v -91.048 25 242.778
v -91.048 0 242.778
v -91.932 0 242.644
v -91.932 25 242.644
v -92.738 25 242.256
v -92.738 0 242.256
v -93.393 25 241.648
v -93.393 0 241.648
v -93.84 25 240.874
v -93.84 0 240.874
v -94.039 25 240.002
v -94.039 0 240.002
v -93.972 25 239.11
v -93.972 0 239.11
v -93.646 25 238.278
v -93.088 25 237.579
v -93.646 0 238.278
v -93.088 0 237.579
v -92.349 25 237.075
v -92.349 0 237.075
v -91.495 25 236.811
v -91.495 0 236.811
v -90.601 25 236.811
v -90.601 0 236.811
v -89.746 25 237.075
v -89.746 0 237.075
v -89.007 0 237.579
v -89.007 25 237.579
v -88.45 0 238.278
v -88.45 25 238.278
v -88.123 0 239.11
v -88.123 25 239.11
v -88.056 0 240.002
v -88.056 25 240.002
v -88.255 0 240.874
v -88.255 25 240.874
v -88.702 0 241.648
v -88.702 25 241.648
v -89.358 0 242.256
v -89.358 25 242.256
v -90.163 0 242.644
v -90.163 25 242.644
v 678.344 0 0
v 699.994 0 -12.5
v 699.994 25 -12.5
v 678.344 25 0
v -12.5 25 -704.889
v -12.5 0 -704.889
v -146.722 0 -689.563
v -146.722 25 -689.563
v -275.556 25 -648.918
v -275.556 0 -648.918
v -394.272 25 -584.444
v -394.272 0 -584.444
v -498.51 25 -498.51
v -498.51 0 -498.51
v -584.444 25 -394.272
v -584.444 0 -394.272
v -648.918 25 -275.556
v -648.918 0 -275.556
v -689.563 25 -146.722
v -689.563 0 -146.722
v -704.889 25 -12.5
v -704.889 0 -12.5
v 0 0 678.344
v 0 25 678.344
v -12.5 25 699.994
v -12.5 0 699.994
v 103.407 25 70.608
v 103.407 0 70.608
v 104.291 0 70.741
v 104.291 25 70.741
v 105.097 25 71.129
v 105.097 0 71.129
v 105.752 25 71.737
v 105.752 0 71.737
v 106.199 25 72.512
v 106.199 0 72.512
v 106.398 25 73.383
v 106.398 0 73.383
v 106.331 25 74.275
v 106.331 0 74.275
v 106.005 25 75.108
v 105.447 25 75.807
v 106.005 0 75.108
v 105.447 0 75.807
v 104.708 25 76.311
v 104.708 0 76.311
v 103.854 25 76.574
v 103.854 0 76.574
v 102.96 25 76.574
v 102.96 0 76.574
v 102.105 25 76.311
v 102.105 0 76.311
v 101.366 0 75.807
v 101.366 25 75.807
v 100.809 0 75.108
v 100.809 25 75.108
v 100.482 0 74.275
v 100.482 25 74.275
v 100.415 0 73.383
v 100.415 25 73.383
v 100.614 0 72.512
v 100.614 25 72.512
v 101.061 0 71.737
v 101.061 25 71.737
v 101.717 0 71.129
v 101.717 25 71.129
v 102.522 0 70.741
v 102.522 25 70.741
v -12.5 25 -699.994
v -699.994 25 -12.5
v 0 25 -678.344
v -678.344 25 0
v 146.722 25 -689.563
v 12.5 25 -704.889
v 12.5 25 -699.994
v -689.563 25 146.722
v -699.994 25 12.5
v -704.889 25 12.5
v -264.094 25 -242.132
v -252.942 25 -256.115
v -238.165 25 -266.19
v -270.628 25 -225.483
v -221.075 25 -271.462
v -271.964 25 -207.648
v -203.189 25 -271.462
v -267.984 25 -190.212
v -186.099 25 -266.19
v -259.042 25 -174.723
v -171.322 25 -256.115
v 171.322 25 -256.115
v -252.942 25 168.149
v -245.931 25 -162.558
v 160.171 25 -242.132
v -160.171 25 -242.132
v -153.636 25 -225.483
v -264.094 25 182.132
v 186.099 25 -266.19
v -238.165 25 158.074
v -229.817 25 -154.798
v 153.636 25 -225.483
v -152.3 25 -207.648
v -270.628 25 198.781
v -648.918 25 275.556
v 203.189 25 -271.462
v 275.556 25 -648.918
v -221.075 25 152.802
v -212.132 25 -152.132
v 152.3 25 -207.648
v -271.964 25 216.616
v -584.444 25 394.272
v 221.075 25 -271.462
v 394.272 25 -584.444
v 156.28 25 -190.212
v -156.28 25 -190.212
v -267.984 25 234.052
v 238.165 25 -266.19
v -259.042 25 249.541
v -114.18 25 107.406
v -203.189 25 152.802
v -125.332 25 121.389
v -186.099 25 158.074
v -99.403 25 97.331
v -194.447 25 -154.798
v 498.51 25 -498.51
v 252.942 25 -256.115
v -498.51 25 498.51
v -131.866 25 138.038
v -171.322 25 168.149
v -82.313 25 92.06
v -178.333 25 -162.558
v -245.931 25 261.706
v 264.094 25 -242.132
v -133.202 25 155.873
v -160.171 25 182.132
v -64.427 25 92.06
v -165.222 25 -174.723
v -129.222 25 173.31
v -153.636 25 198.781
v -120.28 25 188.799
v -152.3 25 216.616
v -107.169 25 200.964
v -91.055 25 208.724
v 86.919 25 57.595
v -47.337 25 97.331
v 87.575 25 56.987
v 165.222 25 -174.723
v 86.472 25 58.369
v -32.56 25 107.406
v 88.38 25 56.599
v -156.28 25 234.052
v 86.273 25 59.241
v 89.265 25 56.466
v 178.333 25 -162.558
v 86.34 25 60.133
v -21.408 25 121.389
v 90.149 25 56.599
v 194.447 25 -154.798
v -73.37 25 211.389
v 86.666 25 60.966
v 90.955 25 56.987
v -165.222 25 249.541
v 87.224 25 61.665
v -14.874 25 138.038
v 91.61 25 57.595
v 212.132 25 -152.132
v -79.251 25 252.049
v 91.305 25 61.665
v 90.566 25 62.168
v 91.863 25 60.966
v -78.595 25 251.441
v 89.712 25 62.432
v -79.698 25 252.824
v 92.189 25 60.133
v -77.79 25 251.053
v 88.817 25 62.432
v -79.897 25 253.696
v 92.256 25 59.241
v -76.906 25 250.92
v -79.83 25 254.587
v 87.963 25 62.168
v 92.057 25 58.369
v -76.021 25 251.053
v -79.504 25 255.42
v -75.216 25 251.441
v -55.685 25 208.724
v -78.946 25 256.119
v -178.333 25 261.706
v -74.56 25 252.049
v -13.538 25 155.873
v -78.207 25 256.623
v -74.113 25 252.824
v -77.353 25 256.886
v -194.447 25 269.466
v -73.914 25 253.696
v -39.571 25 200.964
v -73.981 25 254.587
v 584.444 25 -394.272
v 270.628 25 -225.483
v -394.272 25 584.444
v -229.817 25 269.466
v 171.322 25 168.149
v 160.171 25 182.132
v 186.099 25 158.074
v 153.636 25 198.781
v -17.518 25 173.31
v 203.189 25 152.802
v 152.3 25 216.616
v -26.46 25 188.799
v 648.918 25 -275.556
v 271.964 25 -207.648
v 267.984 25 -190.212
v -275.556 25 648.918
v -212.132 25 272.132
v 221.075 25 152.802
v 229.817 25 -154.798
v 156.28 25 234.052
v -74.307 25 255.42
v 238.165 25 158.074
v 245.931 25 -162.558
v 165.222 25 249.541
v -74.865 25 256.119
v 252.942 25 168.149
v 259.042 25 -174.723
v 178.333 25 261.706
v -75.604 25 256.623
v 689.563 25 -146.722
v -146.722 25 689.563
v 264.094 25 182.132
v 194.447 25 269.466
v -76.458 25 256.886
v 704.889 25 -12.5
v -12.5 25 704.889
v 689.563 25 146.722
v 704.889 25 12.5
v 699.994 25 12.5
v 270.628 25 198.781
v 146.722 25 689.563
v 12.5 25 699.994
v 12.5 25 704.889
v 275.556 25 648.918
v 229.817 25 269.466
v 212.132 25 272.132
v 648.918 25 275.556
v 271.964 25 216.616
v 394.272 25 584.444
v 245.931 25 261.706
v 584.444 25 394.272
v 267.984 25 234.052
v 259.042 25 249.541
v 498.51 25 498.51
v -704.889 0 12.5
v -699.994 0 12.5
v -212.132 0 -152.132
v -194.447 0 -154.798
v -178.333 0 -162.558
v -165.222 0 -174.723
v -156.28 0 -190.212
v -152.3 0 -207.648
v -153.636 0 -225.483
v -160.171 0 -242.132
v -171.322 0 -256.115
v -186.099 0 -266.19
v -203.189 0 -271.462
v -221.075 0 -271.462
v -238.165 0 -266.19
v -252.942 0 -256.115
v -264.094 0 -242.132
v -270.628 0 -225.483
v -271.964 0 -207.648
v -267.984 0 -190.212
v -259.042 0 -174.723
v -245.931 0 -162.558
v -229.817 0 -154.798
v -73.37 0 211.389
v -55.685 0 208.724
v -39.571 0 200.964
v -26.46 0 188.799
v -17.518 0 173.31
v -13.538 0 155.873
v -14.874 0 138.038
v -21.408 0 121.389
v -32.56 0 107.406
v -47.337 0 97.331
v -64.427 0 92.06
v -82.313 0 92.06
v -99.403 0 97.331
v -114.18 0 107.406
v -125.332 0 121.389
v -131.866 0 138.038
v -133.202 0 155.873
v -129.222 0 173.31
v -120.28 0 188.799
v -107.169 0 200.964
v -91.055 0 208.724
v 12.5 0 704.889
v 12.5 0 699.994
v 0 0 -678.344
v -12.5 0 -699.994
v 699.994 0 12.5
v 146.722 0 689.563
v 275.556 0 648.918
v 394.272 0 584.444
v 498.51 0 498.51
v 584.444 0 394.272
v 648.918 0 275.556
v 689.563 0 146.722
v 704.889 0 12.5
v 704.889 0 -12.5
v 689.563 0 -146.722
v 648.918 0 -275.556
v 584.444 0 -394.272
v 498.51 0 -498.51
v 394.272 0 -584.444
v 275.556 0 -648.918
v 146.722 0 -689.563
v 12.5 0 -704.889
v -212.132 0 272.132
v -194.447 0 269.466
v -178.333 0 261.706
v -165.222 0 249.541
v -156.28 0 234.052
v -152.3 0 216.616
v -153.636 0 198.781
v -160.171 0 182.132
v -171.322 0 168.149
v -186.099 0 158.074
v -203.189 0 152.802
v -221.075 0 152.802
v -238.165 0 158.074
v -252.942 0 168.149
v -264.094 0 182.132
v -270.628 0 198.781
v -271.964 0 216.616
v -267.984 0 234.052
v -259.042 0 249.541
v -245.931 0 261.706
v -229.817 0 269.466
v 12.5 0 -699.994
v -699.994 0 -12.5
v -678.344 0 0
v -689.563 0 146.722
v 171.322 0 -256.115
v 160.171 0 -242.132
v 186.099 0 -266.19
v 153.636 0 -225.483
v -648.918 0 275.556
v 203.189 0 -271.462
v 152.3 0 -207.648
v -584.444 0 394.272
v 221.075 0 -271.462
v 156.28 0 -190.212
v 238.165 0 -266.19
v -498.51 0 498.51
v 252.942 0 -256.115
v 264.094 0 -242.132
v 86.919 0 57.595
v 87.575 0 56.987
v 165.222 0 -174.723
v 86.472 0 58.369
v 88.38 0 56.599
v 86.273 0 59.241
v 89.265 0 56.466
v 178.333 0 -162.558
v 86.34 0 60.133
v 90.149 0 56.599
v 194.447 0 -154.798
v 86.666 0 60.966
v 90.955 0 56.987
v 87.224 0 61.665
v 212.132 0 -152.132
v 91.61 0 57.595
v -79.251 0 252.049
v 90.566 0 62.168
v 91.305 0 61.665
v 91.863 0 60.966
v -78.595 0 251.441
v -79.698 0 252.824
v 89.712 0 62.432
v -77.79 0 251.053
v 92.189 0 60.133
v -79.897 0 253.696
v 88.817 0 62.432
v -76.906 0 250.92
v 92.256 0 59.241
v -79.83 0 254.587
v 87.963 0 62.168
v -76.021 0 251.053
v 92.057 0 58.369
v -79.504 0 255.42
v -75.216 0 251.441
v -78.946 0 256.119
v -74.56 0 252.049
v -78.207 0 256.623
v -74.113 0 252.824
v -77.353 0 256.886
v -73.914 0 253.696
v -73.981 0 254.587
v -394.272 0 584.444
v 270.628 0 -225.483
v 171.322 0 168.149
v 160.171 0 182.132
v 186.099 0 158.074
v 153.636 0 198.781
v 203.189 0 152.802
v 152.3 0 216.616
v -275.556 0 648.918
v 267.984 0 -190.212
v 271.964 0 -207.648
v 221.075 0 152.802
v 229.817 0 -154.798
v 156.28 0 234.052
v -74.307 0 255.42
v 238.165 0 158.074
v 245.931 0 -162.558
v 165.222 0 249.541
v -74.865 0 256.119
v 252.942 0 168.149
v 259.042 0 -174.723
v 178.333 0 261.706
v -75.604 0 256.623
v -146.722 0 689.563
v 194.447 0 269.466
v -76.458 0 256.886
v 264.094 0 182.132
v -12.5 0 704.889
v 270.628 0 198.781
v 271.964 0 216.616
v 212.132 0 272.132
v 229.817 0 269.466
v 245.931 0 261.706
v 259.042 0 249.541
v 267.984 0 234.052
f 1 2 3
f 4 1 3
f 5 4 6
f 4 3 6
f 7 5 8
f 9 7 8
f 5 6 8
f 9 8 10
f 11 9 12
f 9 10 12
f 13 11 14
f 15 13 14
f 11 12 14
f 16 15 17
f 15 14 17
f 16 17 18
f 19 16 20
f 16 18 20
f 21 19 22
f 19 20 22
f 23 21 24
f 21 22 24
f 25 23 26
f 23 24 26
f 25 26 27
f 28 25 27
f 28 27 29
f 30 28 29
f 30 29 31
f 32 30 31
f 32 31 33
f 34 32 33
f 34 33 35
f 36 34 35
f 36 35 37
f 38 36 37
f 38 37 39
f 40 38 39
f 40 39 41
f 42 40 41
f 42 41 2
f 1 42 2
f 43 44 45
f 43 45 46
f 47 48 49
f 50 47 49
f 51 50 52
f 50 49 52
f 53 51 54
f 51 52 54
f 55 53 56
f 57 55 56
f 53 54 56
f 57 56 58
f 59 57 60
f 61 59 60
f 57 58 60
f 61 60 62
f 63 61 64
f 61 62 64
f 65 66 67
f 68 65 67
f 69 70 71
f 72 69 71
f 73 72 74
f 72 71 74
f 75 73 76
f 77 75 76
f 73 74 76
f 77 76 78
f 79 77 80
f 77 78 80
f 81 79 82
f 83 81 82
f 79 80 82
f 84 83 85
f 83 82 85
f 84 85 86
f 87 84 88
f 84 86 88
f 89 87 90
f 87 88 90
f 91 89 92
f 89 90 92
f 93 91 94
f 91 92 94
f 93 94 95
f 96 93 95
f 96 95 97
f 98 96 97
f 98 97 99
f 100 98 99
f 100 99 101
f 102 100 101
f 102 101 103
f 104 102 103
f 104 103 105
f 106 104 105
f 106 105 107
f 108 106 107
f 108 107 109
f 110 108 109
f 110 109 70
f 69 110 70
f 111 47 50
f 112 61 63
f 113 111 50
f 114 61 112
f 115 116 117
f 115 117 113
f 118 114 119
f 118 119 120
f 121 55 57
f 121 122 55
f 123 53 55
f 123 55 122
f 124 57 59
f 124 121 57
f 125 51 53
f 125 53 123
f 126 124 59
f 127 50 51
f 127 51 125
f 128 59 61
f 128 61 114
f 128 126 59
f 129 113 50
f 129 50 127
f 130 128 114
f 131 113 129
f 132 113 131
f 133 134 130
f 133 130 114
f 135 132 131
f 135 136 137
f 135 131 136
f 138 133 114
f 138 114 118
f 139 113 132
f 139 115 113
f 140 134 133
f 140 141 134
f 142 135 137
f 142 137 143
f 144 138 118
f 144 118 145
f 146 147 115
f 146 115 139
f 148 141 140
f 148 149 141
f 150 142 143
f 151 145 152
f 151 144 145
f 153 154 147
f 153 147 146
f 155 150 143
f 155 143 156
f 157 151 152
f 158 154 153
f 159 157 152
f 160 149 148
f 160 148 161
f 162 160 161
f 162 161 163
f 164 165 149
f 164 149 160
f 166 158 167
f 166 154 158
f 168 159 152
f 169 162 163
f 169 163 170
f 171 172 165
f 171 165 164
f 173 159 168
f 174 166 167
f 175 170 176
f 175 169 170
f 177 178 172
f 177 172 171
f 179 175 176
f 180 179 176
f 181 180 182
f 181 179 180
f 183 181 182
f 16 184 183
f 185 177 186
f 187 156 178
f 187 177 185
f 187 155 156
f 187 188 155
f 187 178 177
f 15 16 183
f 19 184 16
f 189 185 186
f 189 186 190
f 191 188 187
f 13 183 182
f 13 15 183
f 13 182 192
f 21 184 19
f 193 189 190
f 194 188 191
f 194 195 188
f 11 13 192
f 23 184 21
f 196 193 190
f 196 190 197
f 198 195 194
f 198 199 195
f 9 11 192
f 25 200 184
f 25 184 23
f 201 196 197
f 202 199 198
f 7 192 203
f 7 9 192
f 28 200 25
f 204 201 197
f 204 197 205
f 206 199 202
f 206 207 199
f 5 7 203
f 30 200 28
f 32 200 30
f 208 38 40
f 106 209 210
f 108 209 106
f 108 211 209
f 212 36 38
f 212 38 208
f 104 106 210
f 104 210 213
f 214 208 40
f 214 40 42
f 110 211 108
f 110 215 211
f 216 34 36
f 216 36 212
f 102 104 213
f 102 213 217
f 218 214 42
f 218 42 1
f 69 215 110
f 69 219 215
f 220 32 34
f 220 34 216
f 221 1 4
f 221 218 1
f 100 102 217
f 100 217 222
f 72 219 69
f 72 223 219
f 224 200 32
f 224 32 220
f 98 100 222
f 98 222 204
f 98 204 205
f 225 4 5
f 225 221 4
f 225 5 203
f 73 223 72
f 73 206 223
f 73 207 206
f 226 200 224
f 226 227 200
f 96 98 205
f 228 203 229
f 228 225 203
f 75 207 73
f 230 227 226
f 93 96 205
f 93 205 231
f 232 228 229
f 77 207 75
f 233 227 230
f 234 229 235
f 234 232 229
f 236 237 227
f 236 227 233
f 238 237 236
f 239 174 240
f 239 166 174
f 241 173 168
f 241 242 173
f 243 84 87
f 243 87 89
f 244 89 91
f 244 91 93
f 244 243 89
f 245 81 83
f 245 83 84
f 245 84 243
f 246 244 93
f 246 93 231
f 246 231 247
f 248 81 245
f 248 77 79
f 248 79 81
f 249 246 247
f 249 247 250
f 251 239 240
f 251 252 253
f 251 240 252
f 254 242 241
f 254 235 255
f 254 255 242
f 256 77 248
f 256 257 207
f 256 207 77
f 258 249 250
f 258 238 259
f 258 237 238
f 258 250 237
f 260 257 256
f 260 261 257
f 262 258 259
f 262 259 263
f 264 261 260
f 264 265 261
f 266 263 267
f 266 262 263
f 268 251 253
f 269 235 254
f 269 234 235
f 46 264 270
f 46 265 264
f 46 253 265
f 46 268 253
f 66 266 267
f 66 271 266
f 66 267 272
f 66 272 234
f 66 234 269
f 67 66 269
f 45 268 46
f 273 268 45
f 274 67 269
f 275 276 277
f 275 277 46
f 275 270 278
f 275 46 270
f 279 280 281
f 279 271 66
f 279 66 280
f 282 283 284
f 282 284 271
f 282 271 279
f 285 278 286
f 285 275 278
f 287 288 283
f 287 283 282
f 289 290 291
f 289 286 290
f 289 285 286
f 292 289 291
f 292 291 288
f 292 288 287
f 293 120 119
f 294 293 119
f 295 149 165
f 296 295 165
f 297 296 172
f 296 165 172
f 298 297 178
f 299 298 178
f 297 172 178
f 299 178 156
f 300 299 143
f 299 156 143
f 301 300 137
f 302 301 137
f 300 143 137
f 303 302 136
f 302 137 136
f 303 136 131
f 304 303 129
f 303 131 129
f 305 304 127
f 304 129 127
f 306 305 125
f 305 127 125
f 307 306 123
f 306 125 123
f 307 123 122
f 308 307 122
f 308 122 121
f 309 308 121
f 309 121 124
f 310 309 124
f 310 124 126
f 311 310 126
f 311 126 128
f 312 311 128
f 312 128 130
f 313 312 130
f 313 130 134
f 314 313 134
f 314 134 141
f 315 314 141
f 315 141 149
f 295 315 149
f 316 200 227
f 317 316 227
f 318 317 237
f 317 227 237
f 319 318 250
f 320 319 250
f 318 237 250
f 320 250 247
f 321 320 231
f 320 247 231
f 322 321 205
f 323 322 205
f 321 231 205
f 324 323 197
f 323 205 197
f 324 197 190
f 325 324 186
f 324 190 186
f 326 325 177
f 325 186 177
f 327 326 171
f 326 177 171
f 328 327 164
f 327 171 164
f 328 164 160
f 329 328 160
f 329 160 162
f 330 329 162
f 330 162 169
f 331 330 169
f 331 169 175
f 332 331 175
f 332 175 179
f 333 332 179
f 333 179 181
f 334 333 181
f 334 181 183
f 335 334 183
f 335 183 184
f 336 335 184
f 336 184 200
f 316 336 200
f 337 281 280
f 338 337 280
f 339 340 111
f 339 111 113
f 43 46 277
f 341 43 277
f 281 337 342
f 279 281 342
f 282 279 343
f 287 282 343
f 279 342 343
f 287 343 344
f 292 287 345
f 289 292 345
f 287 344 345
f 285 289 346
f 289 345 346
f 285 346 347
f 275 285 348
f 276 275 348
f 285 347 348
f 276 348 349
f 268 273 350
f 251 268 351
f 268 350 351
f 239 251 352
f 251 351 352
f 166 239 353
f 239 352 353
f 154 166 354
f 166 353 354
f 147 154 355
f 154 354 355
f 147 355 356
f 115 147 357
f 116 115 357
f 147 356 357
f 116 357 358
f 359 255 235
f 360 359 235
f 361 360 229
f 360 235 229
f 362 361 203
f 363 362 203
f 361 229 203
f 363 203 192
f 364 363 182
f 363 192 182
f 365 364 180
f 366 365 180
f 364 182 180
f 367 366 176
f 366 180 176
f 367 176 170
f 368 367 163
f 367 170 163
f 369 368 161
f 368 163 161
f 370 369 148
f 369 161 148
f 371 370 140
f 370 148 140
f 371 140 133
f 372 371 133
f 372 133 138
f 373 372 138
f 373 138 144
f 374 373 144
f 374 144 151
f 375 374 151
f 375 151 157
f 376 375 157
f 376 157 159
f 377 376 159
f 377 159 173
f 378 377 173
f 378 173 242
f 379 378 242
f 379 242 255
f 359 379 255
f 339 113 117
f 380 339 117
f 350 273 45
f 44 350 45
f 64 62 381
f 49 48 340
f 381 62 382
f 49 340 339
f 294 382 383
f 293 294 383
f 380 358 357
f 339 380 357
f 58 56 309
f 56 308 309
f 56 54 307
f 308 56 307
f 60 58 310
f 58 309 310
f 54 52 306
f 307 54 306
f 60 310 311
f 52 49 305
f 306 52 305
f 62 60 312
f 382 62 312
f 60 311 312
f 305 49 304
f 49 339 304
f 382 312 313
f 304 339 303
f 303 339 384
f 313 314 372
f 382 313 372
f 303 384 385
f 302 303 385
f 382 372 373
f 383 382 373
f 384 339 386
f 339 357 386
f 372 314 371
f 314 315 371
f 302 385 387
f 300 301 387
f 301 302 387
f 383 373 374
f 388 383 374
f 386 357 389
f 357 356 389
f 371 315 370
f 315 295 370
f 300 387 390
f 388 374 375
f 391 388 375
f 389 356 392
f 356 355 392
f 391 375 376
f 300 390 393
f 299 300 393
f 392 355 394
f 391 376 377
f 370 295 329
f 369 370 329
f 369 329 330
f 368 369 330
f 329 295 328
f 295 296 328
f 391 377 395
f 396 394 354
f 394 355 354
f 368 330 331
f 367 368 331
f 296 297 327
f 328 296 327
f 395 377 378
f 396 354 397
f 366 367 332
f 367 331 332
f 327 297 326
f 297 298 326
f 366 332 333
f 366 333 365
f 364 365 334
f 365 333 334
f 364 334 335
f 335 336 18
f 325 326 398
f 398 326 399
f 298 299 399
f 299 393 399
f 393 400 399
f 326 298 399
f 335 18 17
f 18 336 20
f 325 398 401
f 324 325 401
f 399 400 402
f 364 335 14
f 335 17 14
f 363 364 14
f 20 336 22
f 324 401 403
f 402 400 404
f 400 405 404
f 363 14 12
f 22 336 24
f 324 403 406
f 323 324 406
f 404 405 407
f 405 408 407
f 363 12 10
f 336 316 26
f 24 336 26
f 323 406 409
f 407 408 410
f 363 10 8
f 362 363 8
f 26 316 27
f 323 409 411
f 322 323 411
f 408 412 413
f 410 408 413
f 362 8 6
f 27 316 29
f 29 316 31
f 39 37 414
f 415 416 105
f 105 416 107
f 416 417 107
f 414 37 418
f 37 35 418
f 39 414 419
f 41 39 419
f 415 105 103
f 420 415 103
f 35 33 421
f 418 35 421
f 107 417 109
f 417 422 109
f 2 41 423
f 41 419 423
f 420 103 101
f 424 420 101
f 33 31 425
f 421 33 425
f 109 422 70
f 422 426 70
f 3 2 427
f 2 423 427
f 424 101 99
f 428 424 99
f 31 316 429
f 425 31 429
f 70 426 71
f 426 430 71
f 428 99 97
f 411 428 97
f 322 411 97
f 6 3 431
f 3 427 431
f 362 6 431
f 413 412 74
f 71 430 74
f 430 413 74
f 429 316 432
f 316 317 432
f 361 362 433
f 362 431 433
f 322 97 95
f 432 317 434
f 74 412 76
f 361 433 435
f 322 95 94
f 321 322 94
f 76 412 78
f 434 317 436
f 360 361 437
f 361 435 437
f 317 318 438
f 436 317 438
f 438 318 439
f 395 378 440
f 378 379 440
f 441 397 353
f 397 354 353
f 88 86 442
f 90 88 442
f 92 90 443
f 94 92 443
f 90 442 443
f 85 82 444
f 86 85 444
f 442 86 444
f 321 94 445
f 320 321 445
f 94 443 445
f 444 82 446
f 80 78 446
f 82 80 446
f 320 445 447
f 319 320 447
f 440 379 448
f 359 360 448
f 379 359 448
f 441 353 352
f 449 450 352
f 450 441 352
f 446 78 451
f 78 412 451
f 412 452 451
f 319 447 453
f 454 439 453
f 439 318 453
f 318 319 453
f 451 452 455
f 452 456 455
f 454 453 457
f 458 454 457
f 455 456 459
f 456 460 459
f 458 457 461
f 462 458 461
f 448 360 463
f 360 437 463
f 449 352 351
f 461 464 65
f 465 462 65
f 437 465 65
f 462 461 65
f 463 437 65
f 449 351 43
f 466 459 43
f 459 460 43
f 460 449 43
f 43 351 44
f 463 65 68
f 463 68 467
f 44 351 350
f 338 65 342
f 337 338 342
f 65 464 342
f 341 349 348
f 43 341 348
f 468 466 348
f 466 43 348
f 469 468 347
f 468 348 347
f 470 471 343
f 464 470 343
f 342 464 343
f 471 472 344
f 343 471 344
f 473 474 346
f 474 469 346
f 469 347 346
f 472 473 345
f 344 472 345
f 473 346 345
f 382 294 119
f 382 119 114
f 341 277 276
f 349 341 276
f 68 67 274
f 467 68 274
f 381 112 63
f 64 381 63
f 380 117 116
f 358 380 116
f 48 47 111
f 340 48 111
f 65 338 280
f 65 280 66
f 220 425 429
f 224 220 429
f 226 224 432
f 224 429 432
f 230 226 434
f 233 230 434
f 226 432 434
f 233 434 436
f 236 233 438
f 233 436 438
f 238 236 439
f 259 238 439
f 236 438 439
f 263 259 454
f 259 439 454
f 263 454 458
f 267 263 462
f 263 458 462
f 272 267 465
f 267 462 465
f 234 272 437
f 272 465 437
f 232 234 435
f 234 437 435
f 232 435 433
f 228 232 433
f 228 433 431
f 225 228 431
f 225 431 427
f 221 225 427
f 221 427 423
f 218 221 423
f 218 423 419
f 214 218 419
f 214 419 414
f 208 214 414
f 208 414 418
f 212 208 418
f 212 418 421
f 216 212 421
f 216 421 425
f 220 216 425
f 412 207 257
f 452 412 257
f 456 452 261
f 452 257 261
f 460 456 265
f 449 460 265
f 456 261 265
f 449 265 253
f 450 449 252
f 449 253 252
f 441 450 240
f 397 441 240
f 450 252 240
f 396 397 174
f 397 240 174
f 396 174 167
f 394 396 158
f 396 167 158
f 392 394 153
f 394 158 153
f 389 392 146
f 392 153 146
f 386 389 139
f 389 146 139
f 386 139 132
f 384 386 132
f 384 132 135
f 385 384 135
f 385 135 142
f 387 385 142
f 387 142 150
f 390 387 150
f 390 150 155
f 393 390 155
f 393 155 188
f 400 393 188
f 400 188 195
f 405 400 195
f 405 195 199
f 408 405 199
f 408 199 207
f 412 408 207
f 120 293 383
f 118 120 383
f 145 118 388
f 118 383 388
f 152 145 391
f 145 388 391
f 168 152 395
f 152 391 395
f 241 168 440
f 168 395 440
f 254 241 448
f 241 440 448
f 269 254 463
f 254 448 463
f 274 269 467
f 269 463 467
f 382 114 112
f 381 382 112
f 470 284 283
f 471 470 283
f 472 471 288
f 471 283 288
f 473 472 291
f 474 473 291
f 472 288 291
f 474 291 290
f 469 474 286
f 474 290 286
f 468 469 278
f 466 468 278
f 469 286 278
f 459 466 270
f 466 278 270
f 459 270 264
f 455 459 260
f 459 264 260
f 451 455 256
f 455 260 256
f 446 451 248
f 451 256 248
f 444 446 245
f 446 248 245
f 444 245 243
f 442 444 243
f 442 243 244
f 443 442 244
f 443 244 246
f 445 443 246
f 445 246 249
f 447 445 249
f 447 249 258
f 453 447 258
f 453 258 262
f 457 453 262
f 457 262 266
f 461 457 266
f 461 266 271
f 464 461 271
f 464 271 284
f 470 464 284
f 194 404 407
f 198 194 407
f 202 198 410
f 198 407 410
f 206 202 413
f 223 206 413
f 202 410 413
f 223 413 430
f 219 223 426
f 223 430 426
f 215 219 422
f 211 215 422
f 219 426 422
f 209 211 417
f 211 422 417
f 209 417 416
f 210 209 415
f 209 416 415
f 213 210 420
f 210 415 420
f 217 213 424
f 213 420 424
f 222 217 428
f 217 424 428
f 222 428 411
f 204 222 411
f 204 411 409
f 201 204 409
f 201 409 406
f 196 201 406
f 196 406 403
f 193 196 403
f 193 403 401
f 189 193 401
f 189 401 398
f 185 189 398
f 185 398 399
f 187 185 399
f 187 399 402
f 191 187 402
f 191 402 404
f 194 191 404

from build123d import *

# Parameters (mm, degrees)
SKETCH_1_R               = 705
EXTRUDE_1_DEPTH          = 25
CUT_EXTRUDE_1_REACH      = 999.334
PATTERN_CIRCULAR_1_COUNT = 4
CUT_EXTRUDE_2_REACH      = 999.177
SKETCH_8_R               = 60
SKETCH_11_R              = 60
CUT_EXTRUDE_3_DEPTH      = 100
SKETCH_12_R              = 3
CUT_EXTRUDE_4_DEPTH      = 998.177266087
SKETCH_13_R              = 3
CUT_EXTRUDE_5_DEPTH      = 30


with BuildPart() as part:
    # 草图1 → 凸台-拉伸1 (new body)
    with BuildSketch(Plane(origin=(0, 0, 0), x_dir=(1, 0, 0), z_dir=(0, 1, 0))):
        with Locations(Location((0, 0, 0), (0, 0, 270))):
            Circle(SKETCH_1_R)
    extrude(amount=EXTRUDE_1_DEPTH)

    # 草图2 → 切除-拉伸1 (cut, up to next)
    with BuildSketch(Plane(origin=(0, 25, 0), x_dir=(1, 0, 0), z_dir=(0, 1, 0)), mode=Mode.PRIVATE) as cut_extrude_1_sk1:
        with BuildLine():
            Line((-12.5, -699.994189271), (-12.5, -704.889175687))
            ThreePointArc((-12.5, -704.889175687), (0, -705), (12.5, -704.889175687))
            Line((12.5, -704.889175687), (12.5, -699.994189271))
            Line((12.5, -699.994189271), (0, -678.343554177))
            Line((0, -678.343554177), (-12.5, -699.994189271))
        make_face()
    cut_extrude_1_tool1 = extrude(cut_extrude_1_sk1.sketch, amount=-CUT_EXTRUDE_1_REACH, mode=Mode.PRIVATE) & part.part
    cut_extrude_1 = cut_extrude_1_tool1.solids().sort_by_distance((0, 25, 695.82939))[0]
    add(cut_extrude_1, mode=Mode.SUBTRACT)

    # 阵列(圆周)1: 切除-拉伸1 ×4 about axis
    pattern_circular_1_axis = Axis((0, 0, 0), (0, 1, 0))
    for i in range(1, PATTERN_CIRCULAR_1_COUNT):
        add(cut_extrude_1.rotate(pattern_circular_1_axis, i * 360 / PATTERN_CIRCULAR_1_COUNT), mode=Mode.SUBTRACT)

    # 草图8 → 切除-拉伸2 (cut, up to next)
    with BuildSketch(Plane(origin=(0, 25, 0), x_dir=(1, 0, 0), z_dir=(0, 1, 0)), mode=Mode.PRIVATE) as cut_extrude_2_sk1:
        with Locations(Location((212.132034356, -212.132034356, 0), (0, 0, 270))):
            Circle(SKETCH_8_R)
    cut_extrude_2_tool1 = extrude(cut_extrude_2_sk1.sketch, amount=-CUT_EXTRUDE_2_REACH, mode=Mode.PRIVATE) & part.part
    # 草图8 → 切除-拉伸2 (cut, up to next)
    with BuildSketch(Plane(origin=(0, 25, 0), x_dir=(1, 0, 0), z_dir=(0, 1, 0)), mode=Mode.PRIVATE) as cut_extrude_2_sk2:
        with Locations(Location((-212.132034356, -212.132034356, 0), (0, 0, 270))):
            Circle(SKETCH_8_R)
    cut_extrude_2_tool2 = extrude(cut_extrude_2_sk2.sketch, amount=-CUT_EXTRUDE_2_REACH, mode=Mode.PRIVATE) & part.part
    # 草图8 → 切除-拉伸2 (cut, up to next)
    with BuildSketch(Plane(origin=(0, 25, 0), x_dir=(1, 0, 0), z_dir=(0, 1, 0)), mode=Mode.PRIVATE) as cut_extrude_2_sk3:
        with Locations(Location((-212.132034356, 212.132034356, 0), (0, 0, 270))):
            Circle(SKETCH_8_R)
    cut_extrude_2_tool3 = extrude(cut_extrude_2_sk3.sketch, amount=-CUT_EXTRUDE_2_REACH, mode=Mode.PRIVATE) & part.part
    # 草图8 → 切除-拉伸2 (cut, up to next)
    with BuildSketch(Plane(origin=(0, 25, 0), x_dir=(1, 0, 0), z_dir=(0, 1, 0)), mode=Mode.PRIVATE) as cut_extrude_2_sk4:
        with Locations(Location((212.132034356, 212.132034356, 0), (0, 0, 270))):
            Circle(SKETCH_8_R)
    cut_extrude_2_tool4 = extrude(cut_extrude_2_sk4.sketch, amount=-CUT_EXTRUDE_2_REACH, mode=Mode.PRIVATE) & part.part
    add(cut_extrude_2_tool1.solids().sort_by_distance((212.132034, 25, 212.132034))[0], mode=Mode.SUBTRACT)
    add(cut_extrude_2_tool2.solids().sort_by_distance((-212.132034, 25, 212.132034))[0], mode=Mode.SUBTRACT)
    add(cut_extrude_2_tool3.solids().sort_by_distance((-212.132034, 25, -212.132034))[0], mode=Mode.SUBTRACT)
    add(cut_extrude_2_tool4.solids().sort_by_distance((212.132034, 25, -212.132034))[0], mode=Mode.SUBTRACT)

    # 草图11 → 切除-拉伸3 (cut)
    with BuildSketch(Plane(origin=(0, 25, 0), x_dir=(1, 0, 0), z_dir=(0, 1, 0))):
        with Locations(Location((-73.369984345, -151.389388343, 0), (0, 0, 270))):
            Circle(SKETCH_11_R)
    extrude(amount=-CUT_EXTRUDE_3_DEPTH, mode=Mode.SUBTRACT)

    # 草图12 → 切除-拉伸4 (cut, through all)
    with BuildSketch(Plane.XZ):
        with Locations(Location((103.406710952, 73.607642412, 0), (0, 0, 270))):
            Circle(SKETCH_12_R)
        with Locations(Location((89.264575328, 59.465506788, 0), (0, 0, 270))):
            Circle(SKETCH_12_R)
    extrude(amount=-CUT_EXTRUDE_4_DEPTH, mode=Mode.SUBTRACT)

    # 草图13 → 切除-拉伸5 (cut)
    with BuildSketch(Plane.XZ):
        with Locations(Location((-76.905518251, 253.919871615, 0), (0, 0, 270))):
            Circle(SKETCH_13_R)
        with Locations(Location((-91.047653874, 239.777735991, 0), (0, 0, 90))):
            Circle(SKETCH_13_R)
    extrude(amount=-CUT_EXTRUDE_5_DEPTH, mode=Mode.SUBTRACT)


solid = part.part
